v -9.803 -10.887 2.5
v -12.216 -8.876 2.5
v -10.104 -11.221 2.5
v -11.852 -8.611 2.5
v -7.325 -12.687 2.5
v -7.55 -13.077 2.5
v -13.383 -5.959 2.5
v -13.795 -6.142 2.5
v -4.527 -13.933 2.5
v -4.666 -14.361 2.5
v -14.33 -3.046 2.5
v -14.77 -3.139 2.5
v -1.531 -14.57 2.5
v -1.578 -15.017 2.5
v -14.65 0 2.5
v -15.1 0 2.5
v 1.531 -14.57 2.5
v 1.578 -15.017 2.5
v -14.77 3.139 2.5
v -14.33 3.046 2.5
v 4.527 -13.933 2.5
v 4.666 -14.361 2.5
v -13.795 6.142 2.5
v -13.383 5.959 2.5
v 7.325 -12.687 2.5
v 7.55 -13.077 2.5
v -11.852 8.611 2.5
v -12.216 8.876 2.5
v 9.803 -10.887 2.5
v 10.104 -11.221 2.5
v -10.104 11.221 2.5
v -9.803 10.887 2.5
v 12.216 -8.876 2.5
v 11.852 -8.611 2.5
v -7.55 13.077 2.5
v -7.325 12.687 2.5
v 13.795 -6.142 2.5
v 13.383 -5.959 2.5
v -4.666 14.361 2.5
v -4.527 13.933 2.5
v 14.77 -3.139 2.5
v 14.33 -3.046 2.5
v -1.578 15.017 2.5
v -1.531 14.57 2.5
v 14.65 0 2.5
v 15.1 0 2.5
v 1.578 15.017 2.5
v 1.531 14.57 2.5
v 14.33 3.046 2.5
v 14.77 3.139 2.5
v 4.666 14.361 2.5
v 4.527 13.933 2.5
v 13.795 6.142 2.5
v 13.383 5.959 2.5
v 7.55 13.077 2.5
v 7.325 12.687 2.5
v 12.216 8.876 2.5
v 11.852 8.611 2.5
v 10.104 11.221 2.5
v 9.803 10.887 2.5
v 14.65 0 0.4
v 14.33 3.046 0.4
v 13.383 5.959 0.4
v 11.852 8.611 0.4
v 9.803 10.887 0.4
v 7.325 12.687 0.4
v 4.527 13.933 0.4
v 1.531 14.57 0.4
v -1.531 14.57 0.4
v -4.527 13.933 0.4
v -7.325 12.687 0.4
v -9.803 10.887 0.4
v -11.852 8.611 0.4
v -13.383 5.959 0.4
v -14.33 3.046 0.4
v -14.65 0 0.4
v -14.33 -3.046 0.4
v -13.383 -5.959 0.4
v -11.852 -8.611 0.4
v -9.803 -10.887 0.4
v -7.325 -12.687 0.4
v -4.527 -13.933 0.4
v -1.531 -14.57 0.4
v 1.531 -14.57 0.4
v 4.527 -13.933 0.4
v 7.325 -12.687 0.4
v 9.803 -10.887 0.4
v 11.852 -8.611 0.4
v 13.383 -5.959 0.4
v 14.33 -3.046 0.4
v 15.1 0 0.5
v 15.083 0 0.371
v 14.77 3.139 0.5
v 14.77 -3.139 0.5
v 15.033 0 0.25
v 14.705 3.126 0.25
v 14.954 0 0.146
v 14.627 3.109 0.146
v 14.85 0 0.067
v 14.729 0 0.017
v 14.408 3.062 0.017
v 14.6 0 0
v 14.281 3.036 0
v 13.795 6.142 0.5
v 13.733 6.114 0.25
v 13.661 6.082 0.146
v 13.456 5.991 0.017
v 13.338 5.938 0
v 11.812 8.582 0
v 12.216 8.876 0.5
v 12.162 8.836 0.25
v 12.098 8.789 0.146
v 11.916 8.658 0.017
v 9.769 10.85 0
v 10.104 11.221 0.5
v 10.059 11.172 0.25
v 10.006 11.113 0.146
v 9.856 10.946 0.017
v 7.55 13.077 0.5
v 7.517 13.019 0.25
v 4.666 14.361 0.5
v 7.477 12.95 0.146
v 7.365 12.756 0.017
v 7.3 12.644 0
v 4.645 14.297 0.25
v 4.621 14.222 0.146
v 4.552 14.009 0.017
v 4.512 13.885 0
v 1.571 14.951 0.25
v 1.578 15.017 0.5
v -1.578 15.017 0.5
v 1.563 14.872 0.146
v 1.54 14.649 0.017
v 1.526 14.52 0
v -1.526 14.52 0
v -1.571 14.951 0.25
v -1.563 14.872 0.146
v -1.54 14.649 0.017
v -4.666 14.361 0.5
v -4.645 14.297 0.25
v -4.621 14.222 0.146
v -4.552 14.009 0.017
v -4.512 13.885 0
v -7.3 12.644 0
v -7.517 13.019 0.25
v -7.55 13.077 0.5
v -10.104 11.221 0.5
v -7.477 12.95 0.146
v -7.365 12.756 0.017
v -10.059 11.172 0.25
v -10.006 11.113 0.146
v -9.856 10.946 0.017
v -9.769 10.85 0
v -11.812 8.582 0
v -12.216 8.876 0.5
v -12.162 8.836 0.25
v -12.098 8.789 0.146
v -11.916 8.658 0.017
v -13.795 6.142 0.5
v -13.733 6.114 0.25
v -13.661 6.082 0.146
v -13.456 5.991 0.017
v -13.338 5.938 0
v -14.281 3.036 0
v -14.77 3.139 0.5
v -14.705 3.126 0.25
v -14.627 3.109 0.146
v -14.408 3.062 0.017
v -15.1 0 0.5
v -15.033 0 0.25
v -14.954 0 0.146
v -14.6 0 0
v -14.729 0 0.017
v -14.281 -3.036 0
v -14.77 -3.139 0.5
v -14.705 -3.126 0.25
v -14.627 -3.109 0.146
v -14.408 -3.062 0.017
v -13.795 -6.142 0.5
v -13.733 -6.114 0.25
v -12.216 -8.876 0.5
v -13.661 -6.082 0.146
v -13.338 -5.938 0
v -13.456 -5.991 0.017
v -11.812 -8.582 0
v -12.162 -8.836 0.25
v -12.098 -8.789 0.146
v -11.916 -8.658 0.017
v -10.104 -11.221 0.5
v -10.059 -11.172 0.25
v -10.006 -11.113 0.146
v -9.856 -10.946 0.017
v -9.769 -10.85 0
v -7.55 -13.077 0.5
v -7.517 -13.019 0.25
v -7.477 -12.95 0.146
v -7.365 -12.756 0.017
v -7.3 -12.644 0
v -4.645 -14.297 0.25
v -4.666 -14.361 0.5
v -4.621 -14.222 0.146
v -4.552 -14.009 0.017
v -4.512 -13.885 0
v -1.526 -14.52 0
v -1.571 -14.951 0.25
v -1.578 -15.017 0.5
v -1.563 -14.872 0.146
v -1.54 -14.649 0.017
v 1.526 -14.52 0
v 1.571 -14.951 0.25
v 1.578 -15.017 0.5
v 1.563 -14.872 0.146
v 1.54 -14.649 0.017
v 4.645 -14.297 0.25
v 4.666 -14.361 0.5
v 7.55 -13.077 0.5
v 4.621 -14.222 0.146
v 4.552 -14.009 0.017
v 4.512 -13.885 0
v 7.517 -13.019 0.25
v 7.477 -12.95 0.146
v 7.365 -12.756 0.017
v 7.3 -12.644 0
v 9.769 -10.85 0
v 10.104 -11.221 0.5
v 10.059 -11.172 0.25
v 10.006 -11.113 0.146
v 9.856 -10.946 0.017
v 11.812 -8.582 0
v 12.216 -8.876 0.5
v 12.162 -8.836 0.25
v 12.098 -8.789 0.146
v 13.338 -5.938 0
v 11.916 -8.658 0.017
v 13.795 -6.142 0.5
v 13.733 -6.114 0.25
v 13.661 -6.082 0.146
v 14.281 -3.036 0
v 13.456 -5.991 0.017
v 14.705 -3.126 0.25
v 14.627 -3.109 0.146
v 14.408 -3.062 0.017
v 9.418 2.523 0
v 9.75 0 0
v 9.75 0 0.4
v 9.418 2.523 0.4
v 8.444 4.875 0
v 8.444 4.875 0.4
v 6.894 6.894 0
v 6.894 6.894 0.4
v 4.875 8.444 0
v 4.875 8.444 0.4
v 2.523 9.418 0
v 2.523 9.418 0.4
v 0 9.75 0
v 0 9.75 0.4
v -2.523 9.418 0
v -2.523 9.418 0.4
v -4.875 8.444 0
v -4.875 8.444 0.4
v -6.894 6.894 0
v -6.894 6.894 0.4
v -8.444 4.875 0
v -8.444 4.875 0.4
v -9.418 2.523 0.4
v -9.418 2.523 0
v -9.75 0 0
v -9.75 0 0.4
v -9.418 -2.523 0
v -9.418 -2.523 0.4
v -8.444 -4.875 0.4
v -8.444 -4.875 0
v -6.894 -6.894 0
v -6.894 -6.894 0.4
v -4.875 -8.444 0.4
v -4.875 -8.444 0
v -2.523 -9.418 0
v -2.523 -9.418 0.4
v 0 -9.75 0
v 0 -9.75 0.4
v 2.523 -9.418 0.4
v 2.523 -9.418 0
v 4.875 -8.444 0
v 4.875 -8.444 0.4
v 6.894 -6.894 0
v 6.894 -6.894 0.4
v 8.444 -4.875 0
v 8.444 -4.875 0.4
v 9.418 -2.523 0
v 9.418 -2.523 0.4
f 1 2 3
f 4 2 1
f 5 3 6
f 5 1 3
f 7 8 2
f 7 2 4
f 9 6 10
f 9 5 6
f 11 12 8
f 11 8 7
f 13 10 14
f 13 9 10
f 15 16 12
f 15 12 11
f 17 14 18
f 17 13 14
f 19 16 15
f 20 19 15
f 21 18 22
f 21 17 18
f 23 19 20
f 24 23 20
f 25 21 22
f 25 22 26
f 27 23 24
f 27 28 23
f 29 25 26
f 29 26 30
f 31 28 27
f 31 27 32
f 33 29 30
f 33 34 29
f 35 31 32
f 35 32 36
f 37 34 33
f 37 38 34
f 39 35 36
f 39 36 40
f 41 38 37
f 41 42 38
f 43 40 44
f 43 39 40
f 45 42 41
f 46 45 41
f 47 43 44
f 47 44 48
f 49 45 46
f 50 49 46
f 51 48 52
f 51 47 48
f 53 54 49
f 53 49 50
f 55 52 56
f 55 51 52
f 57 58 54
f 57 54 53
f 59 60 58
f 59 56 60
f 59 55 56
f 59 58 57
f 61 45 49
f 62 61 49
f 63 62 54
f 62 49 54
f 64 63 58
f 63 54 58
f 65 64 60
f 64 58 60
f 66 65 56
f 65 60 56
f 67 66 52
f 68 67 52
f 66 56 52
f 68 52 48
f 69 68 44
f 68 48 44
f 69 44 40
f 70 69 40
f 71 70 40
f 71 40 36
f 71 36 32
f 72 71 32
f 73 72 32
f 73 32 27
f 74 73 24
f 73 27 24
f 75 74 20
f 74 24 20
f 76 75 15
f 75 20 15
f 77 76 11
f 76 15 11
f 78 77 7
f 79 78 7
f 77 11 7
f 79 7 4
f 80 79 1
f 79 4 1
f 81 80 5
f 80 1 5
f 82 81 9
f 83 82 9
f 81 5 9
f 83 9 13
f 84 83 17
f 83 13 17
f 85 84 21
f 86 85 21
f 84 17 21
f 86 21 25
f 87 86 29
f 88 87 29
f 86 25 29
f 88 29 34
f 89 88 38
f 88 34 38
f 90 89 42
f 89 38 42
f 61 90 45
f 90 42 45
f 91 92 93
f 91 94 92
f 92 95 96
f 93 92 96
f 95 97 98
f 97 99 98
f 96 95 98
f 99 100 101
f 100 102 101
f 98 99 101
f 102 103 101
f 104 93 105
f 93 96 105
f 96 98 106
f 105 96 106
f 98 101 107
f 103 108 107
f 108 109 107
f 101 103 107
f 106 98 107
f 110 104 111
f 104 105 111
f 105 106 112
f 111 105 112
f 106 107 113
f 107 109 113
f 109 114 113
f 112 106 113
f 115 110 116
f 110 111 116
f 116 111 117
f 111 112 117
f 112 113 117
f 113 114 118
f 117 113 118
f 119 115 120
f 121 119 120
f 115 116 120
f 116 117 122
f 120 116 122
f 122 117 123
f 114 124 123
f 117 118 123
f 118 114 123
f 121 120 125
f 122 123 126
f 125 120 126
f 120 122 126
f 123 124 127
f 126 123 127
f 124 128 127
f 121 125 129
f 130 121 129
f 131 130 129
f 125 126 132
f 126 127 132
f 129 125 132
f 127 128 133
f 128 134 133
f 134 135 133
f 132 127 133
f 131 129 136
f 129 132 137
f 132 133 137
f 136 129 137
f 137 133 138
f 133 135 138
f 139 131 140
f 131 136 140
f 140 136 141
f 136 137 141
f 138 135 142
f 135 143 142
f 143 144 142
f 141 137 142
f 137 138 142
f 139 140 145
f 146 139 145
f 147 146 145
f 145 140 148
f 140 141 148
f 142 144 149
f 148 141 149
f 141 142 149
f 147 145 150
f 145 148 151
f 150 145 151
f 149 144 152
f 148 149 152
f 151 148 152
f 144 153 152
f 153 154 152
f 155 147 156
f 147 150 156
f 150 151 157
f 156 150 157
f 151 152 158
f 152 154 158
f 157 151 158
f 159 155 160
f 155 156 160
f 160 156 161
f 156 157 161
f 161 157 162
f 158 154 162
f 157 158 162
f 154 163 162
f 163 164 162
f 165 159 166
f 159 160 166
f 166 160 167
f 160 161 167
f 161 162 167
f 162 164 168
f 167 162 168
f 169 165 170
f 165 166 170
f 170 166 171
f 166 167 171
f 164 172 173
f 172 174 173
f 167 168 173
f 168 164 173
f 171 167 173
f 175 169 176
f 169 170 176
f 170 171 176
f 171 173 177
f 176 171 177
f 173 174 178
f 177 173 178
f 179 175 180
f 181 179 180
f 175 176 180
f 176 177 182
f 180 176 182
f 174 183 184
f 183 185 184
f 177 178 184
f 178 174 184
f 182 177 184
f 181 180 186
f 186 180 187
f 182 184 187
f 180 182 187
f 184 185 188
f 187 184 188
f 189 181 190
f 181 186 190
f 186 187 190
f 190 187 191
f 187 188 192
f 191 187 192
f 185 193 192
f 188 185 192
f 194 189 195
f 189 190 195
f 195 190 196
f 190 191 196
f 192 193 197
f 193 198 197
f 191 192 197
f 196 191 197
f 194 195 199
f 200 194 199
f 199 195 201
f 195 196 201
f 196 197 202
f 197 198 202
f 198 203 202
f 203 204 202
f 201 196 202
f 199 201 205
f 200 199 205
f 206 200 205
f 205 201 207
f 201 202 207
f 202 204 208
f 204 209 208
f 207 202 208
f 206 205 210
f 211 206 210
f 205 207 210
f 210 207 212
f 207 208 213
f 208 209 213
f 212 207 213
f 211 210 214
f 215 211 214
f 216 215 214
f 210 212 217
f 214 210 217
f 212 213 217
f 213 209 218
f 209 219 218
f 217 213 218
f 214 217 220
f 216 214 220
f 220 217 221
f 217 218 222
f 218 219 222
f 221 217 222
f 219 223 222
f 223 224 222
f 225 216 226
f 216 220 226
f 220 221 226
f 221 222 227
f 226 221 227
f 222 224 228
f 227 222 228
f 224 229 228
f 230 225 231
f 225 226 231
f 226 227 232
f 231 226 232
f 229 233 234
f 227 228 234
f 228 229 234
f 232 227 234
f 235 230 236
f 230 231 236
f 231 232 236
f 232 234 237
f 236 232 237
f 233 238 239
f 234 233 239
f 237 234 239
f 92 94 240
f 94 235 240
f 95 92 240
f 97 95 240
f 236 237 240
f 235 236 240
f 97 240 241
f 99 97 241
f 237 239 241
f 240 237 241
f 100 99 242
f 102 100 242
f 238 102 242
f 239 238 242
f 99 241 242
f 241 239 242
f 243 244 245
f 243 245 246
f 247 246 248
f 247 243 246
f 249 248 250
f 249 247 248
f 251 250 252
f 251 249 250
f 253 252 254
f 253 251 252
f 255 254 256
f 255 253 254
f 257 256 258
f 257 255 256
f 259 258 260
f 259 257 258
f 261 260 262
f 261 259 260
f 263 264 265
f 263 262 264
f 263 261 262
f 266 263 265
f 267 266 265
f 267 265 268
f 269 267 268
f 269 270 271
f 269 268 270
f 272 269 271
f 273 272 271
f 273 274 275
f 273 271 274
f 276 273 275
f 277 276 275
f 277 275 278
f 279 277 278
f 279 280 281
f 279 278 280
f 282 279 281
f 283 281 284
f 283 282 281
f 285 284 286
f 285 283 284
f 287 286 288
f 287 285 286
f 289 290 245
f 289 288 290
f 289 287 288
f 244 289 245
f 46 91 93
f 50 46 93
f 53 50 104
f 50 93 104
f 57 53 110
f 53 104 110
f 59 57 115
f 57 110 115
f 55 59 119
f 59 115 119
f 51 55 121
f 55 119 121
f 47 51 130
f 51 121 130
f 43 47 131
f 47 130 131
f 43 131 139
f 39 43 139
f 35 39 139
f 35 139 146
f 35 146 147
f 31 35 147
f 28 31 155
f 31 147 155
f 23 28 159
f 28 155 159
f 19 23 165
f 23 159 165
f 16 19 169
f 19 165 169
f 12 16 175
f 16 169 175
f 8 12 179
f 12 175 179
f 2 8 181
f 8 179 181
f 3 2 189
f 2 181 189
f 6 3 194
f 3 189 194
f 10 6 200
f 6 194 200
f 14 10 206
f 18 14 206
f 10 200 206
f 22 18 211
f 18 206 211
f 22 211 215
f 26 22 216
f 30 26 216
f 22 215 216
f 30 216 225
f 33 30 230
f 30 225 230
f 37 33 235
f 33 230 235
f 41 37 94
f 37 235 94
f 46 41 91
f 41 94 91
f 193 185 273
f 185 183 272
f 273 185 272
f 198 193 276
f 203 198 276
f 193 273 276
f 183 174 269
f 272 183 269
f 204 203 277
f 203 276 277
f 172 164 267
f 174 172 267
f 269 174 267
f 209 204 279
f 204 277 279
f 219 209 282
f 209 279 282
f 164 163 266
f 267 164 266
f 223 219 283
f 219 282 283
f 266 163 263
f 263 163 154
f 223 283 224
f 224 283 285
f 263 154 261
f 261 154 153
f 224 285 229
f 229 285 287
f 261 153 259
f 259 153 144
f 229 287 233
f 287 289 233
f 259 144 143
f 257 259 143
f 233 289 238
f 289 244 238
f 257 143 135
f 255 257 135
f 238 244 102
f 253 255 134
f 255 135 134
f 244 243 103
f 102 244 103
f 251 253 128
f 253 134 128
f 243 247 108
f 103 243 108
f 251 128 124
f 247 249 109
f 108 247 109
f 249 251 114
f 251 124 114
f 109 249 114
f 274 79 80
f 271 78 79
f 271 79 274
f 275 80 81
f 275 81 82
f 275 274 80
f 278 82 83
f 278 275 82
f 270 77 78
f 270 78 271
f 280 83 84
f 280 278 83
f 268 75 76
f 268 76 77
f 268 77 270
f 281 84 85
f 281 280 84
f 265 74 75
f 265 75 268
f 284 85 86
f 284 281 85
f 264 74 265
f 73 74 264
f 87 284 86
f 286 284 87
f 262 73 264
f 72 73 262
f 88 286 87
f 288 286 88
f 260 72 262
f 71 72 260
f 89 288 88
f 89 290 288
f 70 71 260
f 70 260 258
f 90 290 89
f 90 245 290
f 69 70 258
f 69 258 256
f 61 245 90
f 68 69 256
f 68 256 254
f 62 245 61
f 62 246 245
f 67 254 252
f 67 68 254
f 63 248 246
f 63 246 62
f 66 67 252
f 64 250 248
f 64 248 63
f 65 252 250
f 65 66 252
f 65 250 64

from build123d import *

# Parameters (mm, degrees)
F0_R     = 15.1
F0_R_2   = 9.75
F1_DEPTH = 2.5
F2_R     = 14.65
F3_DEPTH = 2.1
F4_R     = 0.5


with BuildPart() as f1:
    # F0 (on Top) → F1 (new body)
    with BuildSketch(Plane.XY):
        Circle(F0_R)
        Circle(F0_R_2, mode=Mode.SUBTRACT)
    extrude(amount=F1_DEPTH)

    # F2 (on face) → F3 (cut)
    with BuildSketch(Plane.XY.offset(2.5)):
        Circle(F2_R)
    extrude(amount=-F3_DEPTH, mode=Mode.SUBTRACT)

    # F4
    f4_edges = [f1.edges().sort_by_distance(p)[0] for p in [
        (-15.1, 0, 0),
    ]]
    fillet(f4_edges, radius=F4_R)


solid = f1.part
